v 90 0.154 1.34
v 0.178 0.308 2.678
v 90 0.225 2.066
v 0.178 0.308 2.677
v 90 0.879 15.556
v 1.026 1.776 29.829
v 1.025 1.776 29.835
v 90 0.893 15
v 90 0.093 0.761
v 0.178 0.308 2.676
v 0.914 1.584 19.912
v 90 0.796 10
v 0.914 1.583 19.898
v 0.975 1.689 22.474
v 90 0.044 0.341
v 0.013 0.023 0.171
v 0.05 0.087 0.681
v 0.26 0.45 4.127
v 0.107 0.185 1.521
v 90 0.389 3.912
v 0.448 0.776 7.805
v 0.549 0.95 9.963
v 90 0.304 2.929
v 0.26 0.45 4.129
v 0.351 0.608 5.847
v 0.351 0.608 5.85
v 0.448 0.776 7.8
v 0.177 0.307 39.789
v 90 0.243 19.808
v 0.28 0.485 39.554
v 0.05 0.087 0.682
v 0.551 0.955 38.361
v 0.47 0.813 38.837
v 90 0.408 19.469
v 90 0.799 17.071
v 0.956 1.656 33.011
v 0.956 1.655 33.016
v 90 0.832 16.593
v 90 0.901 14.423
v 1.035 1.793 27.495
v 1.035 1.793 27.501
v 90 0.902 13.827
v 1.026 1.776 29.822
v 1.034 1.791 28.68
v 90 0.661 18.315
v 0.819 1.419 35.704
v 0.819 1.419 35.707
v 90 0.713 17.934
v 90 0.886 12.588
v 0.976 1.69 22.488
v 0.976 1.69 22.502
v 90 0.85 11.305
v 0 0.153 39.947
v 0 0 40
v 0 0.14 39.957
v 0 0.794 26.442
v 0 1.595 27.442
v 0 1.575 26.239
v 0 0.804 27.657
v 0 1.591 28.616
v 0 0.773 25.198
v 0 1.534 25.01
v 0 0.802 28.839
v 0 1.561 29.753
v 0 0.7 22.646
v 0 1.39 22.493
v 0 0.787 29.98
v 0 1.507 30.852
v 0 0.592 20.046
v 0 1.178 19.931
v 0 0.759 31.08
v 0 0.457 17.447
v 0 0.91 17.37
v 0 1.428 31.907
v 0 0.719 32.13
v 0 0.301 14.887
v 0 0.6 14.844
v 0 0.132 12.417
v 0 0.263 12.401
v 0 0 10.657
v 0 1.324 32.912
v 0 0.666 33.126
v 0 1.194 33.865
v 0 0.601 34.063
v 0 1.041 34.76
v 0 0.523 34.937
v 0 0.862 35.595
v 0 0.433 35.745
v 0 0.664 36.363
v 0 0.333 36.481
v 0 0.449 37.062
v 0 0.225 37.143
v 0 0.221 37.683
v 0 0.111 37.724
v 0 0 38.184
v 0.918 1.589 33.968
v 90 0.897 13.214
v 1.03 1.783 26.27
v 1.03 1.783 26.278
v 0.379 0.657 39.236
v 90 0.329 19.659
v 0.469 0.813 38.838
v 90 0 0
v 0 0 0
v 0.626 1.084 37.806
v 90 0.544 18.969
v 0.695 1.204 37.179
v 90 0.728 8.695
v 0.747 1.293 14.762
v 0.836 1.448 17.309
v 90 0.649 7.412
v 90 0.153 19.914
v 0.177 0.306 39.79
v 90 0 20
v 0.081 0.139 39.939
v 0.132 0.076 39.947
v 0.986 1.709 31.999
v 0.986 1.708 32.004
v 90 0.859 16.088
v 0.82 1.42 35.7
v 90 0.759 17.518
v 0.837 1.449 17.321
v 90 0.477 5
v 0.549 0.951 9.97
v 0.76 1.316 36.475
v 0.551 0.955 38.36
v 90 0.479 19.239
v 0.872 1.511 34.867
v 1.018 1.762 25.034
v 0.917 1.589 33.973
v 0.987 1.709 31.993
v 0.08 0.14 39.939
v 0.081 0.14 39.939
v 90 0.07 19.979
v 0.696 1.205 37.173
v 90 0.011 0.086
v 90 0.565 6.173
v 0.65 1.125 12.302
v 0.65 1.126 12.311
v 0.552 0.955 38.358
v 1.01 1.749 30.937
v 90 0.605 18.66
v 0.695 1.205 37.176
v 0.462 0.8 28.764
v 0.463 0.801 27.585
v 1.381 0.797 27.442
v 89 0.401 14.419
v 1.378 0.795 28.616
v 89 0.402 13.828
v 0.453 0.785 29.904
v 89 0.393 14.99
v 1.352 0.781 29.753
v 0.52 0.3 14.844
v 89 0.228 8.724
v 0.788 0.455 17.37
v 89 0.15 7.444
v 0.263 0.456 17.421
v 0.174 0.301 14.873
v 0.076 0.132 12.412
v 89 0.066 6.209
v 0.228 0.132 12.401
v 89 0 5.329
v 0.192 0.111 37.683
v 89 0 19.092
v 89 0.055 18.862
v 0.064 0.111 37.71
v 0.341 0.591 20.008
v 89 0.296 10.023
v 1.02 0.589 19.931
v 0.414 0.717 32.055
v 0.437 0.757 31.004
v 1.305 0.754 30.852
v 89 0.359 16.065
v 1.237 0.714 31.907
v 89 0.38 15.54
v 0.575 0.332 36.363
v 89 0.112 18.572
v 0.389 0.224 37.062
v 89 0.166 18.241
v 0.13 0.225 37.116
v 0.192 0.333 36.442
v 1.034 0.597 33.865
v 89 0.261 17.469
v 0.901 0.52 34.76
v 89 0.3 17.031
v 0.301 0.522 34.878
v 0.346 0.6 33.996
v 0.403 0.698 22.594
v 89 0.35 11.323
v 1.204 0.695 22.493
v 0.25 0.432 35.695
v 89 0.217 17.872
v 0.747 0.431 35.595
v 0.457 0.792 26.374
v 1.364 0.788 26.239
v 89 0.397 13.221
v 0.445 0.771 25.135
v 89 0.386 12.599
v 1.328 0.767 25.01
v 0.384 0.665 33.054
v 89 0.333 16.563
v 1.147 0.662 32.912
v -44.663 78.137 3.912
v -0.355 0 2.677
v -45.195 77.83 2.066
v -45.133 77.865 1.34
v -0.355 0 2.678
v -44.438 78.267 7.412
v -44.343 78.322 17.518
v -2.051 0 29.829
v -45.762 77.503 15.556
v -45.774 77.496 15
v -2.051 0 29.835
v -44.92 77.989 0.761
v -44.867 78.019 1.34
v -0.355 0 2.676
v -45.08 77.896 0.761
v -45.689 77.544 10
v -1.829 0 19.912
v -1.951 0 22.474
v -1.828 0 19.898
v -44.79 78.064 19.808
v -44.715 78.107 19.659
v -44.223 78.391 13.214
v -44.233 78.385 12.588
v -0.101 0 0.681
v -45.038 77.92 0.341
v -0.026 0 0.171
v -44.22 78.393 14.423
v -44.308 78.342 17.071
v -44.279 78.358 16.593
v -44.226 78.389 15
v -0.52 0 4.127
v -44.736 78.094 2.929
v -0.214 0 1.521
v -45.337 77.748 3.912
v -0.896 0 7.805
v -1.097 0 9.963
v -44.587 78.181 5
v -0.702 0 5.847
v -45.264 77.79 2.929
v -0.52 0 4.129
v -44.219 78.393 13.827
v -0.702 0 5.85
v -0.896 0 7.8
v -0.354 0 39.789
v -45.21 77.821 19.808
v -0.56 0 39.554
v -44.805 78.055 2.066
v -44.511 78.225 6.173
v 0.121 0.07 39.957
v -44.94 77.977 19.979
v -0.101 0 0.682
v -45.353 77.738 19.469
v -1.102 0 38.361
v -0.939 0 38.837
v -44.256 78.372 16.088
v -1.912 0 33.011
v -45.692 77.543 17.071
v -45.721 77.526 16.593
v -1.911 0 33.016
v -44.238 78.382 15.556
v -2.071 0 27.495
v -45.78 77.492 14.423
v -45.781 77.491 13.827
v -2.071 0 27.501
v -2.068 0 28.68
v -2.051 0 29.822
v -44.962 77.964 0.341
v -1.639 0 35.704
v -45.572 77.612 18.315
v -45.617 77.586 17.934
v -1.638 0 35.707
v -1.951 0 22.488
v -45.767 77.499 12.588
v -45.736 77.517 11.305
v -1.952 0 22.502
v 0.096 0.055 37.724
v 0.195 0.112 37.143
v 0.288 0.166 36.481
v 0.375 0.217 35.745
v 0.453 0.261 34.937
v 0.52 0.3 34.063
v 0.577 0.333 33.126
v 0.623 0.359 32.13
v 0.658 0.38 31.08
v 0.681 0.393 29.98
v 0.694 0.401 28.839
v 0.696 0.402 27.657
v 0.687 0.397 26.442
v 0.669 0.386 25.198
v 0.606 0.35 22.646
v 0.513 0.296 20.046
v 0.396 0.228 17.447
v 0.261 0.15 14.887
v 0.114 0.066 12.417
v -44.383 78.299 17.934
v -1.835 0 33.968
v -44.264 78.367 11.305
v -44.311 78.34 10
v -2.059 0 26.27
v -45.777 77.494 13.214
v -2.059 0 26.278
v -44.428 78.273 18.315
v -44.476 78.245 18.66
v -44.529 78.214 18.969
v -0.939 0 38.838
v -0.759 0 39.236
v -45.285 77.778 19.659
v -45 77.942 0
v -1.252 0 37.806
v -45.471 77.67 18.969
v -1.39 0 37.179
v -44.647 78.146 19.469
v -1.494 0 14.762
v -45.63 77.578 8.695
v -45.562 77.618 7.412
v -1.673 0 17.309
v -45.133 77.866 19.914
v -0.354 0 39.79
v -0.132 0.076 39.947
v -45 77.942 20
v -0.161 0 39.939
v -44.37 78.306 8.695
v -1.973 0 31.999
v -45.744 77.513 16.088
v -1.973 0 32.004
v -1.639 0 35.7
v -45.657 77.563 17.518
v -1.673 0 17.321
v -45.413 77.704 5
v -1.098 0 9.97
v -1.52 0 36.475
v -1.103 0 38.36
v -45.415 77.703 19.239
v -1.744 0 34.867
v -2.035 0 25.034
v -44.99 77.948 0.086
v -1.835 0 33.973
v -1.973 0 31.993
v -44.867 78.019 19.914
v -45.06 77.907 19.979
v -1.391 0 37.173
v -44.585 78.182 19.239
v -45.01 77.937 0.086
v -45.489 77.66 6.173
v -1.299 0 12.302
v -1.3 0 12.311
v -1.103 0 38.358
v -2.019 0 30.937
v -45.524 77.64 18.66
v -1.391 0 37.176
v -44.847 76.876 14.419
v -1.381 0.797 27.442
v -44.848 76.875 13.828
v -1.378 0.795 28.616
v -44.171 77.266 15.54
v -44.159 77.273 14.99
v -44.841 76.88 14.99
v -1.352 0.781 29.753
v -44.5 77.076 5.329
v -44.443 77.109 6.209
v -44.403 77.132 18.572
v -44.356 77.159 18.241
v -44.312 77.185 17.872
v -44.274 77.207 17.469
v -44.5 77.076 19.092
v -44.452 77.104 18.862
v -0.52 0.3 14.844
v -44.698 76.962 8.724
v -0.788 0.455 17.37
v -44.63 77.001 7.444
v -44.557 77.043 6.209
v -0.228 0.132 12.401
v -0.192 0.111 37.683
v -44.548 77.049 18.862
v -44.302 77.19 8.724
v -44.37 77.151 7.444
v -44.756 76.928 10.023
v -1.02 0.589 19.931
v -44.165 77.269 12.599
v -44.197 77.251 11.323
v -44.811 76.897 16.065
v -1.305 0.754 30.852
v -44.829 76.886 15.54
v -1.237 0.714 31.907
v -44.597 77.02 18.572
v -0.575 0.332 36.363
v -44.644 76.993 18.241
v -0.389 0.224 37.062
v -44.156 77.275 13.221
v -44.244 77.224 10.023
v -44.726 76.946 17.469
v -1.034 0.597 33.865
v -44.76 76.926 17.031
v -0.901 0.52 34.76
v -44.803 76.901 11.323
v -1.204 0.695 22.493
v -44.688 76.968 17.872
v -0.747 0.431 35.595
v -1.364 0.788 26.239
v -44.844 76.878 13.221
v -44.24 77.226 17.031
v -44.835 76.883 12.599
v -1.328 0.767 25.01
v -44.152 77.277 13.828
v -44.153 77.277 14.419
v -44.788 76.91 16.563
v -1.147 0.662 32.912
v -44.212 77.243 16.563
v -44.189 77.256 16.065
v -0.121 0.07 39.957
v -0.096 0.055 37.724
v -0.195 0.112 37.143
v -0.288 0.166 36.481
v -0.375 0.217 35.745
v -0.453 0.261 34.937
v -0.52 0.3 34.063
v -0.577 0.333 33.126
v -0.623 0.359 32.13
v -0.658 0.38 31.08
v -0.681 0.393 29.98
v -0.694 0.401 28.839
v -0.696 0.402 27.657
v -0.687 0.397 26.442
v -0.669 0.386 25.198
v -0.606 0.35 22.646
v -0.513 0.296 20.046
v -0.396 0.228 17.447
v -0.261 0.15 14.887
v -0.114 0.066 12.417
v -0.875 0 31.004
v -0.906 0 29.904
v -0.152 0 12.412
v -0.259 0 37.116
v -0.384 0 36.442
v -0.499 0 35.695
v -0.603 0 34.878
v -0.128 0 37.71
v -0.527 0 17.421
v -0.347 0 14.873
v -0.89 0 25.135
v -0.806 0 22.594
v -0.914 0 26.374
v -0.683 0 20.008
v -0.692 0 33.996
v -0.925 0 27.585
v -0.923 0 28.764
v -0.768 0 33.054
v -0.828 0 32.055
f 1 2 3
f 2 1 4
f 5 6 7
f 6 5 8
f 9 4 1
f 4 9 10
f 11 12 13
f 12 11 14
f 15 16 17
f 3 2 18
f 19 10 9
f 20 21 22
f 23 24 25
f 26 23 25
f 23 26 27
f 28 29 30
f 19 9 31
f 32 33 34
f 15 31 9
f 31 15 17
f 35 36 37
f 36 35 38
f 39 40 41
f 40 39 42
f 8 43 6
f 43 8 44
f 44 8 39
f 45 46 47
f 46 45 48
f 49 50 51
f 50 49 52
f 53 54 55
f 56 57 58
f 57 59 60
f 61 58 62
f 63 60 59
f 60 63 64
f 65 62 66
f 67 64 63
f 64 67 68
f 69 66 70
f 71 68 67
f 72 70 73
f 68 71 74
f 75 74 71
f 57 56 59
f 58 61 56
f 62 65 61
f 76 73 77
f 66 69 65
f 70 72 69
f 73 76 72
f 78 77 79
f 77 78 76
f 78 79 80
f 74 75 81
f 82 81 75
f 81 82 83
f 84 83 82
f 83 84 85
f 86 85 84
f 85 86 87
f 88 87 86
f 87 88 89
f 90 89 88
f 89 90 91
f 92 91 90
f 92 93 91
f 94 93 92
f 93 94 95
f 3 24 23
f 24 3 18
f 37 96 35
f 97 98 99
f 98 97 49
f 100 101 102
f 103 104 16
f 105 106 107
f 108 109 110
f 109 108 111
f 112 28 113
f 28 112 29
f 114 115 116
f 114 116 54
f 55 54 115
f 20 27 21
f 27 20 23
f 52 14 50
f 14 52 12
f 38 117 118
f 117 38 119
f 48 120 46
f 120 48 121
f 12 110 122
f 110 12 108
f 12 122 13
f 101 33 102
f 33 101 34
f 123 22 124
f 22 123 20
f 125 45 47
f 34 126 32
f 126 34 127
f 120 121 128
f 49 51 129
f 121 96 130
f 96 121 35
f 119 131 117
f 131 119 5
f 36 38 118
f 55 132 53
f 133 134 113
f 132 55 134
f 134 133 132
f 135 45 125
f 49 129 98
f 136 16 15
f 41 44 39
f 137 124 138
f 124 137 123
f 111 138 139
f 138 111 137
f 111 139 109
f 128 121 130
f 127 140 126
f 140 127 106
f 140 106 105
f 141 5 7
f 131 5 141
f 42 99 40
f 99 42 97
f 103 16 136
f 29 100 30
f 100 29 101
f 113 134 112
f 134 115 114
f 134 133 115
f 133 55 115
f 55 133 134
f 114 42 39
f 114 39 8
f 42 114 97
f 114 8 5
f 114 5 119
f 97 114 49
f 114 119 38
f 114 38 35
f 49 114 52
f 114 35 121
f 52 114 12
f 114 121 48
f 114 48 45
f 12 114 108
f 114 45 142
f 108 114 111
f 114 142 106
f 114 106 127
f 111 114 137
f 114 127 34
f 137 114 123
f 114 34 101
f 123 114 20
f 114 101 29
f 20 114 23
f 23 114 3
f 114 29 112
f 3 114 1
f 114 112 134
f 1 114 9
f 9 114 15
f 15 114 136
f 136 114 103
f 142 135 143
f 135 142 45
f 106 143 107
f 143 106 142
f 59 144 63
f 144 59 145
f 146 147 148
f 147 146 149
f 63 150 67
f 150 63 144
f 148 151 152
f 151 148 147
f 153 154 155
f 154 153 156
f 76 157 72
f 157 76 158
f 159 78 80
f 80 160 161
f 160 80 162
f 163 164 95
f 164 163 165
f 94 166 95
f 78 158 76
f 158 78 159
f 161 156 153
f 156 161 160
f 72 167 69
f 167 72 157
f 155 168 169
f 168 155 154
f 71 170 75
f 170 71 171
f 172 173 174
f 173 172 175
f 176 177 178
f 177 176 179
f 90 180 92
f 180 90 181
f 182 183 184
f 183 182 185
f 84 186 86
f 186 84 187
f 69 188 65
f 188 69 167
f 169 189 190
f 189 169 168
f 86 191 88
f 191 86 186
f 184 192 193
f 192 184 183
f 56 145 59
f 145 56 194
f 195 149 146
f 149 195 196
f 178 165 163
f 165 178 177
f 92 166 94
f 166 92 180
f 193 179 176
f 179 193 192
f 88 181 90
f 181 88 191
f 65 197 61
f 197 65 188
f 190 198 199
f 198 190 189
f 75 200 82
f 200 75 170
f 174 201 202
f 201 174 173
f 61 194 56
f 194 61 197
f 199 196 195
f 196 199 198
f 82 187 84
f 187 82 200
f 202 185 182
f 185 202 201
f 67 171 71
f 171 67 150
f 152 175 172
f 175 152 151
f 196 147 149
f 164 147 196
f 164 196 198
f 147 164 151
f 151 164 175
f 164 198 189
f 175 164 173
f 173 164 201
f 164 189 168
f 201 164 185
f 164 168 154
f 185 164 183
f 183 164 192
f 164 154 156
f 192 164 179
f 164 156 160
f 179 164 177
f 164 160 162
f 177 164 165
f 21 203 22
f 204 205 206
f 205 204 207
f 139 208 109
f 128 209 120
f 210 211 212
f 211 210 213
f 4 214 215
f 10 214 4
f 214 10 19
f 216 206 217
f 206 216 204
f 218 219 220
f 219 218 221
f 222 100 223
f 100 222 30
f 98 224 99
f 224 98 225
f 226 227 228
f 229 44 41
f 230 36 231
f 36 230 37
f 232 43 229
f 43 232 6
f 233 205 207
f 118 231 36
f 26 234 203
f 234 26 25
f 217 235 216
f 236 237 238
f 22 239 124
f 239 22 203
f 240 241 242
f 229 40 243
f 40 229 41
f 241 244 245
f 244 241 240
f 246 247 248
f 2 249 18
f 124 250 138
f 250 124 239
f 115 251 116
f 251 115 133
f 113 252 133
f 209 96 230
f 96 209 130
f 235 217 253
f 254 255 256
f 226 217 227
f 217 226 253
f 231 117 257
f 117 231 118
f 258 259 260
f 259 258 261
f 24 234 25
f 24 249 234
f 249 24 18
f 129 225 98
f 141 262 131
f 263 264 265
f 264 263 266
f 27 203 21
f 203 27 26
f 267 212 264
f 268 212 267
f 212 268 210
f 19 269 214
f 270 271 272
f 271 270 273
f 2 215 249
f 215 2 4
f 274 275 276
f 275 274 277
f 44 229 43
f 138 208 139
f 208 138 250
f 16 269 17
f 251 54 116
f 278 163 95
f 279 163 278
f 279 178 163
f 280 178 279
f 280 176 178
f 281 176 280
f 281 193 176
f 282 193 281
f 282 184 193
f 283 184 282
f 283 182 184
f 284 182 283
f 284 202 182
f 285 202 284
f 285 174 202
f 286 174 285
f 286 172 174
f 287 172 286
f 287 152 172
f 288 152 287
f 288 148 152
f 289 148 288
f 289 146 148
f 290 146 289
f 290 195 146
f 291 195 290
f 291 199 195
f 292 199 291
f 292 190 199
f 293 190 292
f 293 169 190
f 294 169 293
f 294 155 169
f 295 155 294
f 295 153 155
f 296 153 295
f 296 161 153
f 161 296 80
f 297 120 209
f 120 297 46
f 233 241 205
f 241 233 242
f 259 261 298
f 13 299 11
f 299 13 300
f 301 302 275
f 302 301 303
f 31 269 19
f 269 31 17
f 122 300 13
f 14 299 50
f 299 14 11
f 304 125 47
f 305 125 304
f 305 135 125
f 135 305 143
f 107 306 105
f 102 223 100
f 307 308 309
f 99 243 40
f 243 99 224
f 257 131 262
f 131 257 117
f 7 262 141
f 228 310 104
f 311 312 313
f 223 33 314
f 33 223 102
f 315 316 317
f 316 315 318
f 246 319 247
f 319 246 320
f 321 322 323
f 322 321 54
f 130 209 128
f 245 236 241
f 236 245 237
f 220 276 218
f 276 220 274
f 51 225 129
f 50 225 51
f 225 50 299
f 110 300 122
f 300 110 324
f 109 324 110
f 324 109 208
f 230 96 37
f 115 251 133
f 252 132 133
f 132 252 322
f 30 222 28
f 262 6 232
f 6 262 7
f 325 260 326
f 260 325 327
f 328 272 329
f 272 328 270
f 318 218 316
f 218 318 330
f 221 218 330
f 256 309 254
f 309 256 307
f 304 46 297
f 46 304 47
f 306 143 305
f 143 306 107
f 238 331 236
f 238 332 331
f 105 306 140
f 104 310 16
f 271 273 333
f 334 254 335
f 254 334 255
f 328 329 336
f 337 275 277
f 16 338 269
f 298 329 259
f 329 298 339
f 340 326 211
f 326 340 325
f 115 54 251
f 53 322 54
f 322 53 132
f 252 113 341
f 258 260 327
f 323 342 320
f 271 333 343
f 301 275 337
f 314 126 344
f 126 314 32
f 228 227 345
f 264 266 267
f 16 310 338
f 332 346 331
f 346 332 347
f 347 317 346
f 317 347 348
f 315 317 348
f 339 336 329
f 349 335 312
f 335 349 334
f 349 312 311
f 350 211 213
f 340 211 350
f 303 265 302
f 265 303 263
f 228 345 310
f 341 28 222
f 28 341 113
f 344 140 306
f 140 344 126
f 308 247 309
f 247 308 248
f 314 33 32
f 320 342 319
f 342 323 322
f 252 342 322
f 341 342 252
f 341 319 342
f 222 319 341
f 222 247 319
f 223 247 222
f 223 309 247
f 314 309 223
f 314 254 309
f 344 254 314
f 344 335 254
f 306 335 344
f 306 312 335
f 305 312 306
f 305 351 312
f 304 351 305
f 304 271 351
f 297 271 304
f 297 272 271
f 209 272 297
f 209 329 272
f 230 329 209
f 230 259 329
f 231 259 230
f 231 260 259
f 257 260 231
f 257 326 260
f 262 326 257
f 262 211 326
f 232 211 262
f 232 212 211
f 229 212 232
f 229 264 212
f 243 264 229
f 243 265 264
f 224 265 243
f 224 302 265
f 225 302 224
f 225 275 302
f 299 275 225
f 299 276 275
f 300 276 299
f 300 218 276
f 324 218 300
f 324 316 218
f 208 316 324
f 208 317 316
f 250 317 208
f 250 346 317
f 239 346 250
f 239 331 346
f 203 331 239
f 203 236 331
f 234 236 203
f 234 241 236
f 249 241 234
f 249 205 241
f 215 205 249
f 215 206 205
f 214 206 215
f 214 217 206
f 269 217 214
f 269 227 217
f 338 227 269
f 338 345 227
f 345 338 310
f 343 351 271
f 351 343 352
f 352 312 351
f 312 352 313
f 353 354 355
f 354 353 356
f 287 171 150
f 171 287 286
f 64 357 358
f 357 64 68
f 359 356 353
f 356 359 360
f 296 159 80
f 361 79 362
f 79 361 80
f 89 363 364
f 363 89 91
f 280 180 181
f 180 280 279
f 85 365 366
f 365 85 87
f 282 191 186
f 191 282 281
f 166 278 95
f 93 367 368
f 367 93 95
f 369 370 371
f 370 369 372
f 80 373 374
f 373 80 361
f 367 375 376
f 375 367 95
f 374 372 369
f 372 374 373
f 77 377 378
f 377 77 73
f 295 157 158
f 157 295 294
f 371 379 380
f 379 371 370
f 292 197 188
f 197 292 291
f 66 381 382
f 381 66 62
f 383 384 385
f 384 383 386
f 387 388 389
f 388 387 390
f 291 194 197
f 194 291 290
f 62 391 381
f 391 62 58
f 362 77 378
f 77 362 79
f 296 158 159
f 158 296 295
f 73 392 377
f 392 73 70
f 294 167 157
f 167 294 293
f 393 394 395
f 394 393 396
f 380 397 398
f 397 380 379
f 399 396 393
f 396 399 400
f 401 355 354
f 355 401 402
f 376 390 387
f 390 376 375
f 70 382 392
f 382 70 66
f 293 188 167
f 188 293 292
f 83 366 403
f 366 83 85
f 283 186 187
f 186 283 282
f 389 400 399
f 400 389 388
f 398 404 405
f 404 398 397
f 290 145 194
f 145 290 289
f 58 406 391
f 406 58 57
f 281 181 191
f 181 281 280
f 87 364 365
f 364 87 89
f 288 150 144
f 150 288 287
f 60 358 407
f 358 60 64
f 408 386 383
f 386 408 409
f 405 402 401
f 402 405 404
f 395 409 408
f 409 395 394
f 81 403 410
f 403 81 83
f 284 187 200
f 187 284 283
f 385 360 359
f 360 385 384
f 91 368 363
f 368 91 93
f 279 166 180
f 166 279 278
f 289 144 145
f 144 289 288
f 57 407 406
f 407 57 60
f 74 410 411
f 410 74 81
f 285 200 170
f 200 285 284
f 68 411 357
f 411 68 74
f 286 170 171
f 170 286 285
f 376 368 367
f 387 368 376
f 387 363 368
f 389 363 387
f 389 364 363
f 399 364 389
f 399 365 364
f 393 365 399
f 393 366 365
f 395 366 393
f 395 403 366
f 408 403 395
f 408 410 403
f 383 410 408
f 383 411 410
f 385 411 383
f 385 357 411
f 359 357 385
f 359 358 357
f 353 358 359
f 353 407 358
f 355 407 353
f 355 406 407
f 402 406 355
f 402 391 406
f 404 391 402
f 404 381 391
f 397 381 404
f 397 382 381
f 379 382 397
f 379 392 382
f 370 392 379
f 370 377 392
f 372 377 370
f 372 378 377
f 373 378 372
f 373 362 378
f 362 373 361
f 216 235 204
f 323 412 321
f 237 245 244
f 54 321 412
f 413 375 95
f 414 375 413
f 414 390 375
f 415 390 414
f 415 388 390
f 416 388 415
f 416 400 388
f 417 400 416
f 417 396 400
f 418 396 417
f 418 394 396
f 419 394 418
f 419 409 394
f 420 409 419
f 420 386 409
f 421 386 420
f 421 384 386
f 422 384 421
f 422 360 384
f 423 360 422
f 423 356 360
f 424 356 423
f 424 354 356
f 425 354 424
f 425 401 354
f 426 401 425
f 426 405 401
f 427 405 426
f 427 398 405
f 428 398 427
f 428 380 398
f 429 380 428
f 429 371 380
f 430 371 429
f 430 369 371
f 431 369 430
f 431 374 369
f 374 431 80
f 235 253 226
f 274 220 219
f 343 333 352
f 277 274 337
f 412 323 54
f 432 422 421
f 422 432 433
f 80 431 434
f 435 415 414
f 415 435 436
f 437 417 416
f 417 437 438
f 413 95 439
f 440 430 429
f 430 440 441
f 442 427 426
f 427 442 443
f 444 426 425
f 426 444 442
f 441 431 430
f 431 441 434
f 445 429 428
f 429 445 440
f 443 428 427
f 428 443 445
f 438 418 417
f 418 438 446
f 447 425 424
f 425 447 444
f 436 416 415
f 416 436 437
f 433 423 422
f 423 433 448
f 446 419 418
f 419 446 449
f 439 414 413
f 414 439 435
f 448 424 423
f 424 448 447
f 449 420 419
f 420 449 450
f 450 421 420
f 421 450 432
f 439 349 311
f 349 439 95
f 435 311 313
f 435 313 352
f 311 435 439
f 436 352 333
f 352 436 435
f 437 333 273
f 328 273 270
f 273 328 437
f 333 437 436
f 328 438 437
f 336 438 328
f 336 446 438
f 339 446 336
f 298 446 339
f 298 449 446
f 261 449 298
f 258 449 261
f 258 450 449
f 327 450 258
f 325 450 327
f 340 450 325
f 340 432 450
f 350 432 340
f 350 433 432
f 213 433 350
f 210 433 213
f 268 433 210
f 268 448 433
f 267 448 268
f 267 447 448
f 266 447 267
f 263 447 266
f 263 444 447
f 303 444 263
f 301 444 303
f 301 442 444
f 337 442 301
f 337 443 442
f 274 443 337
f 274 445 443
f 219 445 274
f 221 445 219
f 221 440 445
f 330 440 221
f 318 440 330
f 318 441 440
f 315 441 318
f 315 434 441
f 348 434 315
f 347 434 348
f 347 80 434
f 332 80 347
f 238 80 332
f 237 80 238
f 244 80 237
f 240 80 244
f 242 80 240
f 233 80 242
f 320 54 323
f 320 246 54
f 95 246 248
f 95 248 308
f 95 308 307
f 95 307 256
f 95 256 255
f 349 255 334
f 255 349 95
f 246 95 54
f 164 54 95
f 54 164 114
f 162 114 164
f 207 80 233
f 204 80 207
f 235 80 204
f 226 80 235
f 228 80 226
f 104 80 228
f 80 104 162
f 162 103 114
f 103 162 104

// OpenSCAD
// Points from n0009sm.dat in the archive: http://m-selig.ae.illinois.edu/ads/archives/coord_seligFmt.tar.gz
// Not necessarily in the same order as in: http://m-selig.ae.illinois.edu/ads/coord/n0009sm.dat

n0009sm_points = [[1000,0],[995.72,0.57],[982.96,2.18],[961.94,4.6299],[933.01,7.7],[896.68,11.27],[853.55,15.22],[804.38,19.4499],[750,23.84],[691.34,28.23],[629.41,32.47],[565.26,36.38],[500,39.78],[434.74,42.4799],[370.5899,44.31],[339.28,44.84],[308.66,45.09],[278.86,45.0399],[250,44.66],[222.21,43.97],[195.6199,42.95],[170.33,41.61],[146.45,39.94],[124.08,37.95],[103.32,35.64],[84.27,33.05],[66.9899,30.23],[51.56,27.2],[38.0599,23.95],[26.53,20.3899],[17.04,16.46],[9.61,12.14],[4.28,7.67],[1.07,3.49],[0,0],[1.07,-3.49],[4.28,-7.67],[9.61,-12.14],[17.04,-16.46],[26.53,-20.39],[38.0599,-23.95],[51.56,-27.2],[66.9899,-30.23],[84.27,-33.0501],[103.32,-35.64],[124.08,-37.95],[146.45,-39.9401],[170.33,-41.61],[195.6199,-42.95],[222.21,-43.97],[250,-44.66],[278.86,-45.04],[308.66,-45.09],[339.28,-44.84],[370.5899,-44.31],[434.74,-42.48],[500,-39.78],[565.26,-36.38],[629.41,-32.47],[691.34,-28.23],[750,-23.84],[804.38,-19.45],[853.55,-15.22],[896.68,-11.27],[933.01,-7.7],[961.94,-4.63],[982.96,-2.18],[995.72,-0.57]];

module hollowFin (length=90, centerheight=40, outerheight=20, wall=1)
{
    ratio = outerheight / centerheight;
    wall = ratio<1 ? wall : wall / ratio;

    difference() {
        rotate([0, 90, 0])  // fin
            linear_extrude(height=length, scale=outerheight/centerheight)
                        scale(centerheight)
                            translate([-1, 0])
                                scale (0.001)
                                    polygon(points=n0009sm_points);

        rotate([0, 90, 0])  // hollow space inside fin
            linear_extrude(height=length-wall, scale=outerheight/centerheight)
                offset(r=-wall)
                            scale(centerheight)
                                translate([-1, 0])
                                    scale (0.001)
                                        polygon(points=n0009sm_points);
    };
}    

module fins (length=90, centerheight=40, outerheight=20, nfins=3, wall=1)
{
    dphi = 360 / nfins;
    for (angle=[0:dphi:360]) {
        rotate([0, 0, angle])
            hollowFin(length, centerheight, outerheight, wall);
    }
}

intersection() {
    color("Green")
        translate([-100, 0, -100])
            cube([200, 200, 200]);
    fins();
};
